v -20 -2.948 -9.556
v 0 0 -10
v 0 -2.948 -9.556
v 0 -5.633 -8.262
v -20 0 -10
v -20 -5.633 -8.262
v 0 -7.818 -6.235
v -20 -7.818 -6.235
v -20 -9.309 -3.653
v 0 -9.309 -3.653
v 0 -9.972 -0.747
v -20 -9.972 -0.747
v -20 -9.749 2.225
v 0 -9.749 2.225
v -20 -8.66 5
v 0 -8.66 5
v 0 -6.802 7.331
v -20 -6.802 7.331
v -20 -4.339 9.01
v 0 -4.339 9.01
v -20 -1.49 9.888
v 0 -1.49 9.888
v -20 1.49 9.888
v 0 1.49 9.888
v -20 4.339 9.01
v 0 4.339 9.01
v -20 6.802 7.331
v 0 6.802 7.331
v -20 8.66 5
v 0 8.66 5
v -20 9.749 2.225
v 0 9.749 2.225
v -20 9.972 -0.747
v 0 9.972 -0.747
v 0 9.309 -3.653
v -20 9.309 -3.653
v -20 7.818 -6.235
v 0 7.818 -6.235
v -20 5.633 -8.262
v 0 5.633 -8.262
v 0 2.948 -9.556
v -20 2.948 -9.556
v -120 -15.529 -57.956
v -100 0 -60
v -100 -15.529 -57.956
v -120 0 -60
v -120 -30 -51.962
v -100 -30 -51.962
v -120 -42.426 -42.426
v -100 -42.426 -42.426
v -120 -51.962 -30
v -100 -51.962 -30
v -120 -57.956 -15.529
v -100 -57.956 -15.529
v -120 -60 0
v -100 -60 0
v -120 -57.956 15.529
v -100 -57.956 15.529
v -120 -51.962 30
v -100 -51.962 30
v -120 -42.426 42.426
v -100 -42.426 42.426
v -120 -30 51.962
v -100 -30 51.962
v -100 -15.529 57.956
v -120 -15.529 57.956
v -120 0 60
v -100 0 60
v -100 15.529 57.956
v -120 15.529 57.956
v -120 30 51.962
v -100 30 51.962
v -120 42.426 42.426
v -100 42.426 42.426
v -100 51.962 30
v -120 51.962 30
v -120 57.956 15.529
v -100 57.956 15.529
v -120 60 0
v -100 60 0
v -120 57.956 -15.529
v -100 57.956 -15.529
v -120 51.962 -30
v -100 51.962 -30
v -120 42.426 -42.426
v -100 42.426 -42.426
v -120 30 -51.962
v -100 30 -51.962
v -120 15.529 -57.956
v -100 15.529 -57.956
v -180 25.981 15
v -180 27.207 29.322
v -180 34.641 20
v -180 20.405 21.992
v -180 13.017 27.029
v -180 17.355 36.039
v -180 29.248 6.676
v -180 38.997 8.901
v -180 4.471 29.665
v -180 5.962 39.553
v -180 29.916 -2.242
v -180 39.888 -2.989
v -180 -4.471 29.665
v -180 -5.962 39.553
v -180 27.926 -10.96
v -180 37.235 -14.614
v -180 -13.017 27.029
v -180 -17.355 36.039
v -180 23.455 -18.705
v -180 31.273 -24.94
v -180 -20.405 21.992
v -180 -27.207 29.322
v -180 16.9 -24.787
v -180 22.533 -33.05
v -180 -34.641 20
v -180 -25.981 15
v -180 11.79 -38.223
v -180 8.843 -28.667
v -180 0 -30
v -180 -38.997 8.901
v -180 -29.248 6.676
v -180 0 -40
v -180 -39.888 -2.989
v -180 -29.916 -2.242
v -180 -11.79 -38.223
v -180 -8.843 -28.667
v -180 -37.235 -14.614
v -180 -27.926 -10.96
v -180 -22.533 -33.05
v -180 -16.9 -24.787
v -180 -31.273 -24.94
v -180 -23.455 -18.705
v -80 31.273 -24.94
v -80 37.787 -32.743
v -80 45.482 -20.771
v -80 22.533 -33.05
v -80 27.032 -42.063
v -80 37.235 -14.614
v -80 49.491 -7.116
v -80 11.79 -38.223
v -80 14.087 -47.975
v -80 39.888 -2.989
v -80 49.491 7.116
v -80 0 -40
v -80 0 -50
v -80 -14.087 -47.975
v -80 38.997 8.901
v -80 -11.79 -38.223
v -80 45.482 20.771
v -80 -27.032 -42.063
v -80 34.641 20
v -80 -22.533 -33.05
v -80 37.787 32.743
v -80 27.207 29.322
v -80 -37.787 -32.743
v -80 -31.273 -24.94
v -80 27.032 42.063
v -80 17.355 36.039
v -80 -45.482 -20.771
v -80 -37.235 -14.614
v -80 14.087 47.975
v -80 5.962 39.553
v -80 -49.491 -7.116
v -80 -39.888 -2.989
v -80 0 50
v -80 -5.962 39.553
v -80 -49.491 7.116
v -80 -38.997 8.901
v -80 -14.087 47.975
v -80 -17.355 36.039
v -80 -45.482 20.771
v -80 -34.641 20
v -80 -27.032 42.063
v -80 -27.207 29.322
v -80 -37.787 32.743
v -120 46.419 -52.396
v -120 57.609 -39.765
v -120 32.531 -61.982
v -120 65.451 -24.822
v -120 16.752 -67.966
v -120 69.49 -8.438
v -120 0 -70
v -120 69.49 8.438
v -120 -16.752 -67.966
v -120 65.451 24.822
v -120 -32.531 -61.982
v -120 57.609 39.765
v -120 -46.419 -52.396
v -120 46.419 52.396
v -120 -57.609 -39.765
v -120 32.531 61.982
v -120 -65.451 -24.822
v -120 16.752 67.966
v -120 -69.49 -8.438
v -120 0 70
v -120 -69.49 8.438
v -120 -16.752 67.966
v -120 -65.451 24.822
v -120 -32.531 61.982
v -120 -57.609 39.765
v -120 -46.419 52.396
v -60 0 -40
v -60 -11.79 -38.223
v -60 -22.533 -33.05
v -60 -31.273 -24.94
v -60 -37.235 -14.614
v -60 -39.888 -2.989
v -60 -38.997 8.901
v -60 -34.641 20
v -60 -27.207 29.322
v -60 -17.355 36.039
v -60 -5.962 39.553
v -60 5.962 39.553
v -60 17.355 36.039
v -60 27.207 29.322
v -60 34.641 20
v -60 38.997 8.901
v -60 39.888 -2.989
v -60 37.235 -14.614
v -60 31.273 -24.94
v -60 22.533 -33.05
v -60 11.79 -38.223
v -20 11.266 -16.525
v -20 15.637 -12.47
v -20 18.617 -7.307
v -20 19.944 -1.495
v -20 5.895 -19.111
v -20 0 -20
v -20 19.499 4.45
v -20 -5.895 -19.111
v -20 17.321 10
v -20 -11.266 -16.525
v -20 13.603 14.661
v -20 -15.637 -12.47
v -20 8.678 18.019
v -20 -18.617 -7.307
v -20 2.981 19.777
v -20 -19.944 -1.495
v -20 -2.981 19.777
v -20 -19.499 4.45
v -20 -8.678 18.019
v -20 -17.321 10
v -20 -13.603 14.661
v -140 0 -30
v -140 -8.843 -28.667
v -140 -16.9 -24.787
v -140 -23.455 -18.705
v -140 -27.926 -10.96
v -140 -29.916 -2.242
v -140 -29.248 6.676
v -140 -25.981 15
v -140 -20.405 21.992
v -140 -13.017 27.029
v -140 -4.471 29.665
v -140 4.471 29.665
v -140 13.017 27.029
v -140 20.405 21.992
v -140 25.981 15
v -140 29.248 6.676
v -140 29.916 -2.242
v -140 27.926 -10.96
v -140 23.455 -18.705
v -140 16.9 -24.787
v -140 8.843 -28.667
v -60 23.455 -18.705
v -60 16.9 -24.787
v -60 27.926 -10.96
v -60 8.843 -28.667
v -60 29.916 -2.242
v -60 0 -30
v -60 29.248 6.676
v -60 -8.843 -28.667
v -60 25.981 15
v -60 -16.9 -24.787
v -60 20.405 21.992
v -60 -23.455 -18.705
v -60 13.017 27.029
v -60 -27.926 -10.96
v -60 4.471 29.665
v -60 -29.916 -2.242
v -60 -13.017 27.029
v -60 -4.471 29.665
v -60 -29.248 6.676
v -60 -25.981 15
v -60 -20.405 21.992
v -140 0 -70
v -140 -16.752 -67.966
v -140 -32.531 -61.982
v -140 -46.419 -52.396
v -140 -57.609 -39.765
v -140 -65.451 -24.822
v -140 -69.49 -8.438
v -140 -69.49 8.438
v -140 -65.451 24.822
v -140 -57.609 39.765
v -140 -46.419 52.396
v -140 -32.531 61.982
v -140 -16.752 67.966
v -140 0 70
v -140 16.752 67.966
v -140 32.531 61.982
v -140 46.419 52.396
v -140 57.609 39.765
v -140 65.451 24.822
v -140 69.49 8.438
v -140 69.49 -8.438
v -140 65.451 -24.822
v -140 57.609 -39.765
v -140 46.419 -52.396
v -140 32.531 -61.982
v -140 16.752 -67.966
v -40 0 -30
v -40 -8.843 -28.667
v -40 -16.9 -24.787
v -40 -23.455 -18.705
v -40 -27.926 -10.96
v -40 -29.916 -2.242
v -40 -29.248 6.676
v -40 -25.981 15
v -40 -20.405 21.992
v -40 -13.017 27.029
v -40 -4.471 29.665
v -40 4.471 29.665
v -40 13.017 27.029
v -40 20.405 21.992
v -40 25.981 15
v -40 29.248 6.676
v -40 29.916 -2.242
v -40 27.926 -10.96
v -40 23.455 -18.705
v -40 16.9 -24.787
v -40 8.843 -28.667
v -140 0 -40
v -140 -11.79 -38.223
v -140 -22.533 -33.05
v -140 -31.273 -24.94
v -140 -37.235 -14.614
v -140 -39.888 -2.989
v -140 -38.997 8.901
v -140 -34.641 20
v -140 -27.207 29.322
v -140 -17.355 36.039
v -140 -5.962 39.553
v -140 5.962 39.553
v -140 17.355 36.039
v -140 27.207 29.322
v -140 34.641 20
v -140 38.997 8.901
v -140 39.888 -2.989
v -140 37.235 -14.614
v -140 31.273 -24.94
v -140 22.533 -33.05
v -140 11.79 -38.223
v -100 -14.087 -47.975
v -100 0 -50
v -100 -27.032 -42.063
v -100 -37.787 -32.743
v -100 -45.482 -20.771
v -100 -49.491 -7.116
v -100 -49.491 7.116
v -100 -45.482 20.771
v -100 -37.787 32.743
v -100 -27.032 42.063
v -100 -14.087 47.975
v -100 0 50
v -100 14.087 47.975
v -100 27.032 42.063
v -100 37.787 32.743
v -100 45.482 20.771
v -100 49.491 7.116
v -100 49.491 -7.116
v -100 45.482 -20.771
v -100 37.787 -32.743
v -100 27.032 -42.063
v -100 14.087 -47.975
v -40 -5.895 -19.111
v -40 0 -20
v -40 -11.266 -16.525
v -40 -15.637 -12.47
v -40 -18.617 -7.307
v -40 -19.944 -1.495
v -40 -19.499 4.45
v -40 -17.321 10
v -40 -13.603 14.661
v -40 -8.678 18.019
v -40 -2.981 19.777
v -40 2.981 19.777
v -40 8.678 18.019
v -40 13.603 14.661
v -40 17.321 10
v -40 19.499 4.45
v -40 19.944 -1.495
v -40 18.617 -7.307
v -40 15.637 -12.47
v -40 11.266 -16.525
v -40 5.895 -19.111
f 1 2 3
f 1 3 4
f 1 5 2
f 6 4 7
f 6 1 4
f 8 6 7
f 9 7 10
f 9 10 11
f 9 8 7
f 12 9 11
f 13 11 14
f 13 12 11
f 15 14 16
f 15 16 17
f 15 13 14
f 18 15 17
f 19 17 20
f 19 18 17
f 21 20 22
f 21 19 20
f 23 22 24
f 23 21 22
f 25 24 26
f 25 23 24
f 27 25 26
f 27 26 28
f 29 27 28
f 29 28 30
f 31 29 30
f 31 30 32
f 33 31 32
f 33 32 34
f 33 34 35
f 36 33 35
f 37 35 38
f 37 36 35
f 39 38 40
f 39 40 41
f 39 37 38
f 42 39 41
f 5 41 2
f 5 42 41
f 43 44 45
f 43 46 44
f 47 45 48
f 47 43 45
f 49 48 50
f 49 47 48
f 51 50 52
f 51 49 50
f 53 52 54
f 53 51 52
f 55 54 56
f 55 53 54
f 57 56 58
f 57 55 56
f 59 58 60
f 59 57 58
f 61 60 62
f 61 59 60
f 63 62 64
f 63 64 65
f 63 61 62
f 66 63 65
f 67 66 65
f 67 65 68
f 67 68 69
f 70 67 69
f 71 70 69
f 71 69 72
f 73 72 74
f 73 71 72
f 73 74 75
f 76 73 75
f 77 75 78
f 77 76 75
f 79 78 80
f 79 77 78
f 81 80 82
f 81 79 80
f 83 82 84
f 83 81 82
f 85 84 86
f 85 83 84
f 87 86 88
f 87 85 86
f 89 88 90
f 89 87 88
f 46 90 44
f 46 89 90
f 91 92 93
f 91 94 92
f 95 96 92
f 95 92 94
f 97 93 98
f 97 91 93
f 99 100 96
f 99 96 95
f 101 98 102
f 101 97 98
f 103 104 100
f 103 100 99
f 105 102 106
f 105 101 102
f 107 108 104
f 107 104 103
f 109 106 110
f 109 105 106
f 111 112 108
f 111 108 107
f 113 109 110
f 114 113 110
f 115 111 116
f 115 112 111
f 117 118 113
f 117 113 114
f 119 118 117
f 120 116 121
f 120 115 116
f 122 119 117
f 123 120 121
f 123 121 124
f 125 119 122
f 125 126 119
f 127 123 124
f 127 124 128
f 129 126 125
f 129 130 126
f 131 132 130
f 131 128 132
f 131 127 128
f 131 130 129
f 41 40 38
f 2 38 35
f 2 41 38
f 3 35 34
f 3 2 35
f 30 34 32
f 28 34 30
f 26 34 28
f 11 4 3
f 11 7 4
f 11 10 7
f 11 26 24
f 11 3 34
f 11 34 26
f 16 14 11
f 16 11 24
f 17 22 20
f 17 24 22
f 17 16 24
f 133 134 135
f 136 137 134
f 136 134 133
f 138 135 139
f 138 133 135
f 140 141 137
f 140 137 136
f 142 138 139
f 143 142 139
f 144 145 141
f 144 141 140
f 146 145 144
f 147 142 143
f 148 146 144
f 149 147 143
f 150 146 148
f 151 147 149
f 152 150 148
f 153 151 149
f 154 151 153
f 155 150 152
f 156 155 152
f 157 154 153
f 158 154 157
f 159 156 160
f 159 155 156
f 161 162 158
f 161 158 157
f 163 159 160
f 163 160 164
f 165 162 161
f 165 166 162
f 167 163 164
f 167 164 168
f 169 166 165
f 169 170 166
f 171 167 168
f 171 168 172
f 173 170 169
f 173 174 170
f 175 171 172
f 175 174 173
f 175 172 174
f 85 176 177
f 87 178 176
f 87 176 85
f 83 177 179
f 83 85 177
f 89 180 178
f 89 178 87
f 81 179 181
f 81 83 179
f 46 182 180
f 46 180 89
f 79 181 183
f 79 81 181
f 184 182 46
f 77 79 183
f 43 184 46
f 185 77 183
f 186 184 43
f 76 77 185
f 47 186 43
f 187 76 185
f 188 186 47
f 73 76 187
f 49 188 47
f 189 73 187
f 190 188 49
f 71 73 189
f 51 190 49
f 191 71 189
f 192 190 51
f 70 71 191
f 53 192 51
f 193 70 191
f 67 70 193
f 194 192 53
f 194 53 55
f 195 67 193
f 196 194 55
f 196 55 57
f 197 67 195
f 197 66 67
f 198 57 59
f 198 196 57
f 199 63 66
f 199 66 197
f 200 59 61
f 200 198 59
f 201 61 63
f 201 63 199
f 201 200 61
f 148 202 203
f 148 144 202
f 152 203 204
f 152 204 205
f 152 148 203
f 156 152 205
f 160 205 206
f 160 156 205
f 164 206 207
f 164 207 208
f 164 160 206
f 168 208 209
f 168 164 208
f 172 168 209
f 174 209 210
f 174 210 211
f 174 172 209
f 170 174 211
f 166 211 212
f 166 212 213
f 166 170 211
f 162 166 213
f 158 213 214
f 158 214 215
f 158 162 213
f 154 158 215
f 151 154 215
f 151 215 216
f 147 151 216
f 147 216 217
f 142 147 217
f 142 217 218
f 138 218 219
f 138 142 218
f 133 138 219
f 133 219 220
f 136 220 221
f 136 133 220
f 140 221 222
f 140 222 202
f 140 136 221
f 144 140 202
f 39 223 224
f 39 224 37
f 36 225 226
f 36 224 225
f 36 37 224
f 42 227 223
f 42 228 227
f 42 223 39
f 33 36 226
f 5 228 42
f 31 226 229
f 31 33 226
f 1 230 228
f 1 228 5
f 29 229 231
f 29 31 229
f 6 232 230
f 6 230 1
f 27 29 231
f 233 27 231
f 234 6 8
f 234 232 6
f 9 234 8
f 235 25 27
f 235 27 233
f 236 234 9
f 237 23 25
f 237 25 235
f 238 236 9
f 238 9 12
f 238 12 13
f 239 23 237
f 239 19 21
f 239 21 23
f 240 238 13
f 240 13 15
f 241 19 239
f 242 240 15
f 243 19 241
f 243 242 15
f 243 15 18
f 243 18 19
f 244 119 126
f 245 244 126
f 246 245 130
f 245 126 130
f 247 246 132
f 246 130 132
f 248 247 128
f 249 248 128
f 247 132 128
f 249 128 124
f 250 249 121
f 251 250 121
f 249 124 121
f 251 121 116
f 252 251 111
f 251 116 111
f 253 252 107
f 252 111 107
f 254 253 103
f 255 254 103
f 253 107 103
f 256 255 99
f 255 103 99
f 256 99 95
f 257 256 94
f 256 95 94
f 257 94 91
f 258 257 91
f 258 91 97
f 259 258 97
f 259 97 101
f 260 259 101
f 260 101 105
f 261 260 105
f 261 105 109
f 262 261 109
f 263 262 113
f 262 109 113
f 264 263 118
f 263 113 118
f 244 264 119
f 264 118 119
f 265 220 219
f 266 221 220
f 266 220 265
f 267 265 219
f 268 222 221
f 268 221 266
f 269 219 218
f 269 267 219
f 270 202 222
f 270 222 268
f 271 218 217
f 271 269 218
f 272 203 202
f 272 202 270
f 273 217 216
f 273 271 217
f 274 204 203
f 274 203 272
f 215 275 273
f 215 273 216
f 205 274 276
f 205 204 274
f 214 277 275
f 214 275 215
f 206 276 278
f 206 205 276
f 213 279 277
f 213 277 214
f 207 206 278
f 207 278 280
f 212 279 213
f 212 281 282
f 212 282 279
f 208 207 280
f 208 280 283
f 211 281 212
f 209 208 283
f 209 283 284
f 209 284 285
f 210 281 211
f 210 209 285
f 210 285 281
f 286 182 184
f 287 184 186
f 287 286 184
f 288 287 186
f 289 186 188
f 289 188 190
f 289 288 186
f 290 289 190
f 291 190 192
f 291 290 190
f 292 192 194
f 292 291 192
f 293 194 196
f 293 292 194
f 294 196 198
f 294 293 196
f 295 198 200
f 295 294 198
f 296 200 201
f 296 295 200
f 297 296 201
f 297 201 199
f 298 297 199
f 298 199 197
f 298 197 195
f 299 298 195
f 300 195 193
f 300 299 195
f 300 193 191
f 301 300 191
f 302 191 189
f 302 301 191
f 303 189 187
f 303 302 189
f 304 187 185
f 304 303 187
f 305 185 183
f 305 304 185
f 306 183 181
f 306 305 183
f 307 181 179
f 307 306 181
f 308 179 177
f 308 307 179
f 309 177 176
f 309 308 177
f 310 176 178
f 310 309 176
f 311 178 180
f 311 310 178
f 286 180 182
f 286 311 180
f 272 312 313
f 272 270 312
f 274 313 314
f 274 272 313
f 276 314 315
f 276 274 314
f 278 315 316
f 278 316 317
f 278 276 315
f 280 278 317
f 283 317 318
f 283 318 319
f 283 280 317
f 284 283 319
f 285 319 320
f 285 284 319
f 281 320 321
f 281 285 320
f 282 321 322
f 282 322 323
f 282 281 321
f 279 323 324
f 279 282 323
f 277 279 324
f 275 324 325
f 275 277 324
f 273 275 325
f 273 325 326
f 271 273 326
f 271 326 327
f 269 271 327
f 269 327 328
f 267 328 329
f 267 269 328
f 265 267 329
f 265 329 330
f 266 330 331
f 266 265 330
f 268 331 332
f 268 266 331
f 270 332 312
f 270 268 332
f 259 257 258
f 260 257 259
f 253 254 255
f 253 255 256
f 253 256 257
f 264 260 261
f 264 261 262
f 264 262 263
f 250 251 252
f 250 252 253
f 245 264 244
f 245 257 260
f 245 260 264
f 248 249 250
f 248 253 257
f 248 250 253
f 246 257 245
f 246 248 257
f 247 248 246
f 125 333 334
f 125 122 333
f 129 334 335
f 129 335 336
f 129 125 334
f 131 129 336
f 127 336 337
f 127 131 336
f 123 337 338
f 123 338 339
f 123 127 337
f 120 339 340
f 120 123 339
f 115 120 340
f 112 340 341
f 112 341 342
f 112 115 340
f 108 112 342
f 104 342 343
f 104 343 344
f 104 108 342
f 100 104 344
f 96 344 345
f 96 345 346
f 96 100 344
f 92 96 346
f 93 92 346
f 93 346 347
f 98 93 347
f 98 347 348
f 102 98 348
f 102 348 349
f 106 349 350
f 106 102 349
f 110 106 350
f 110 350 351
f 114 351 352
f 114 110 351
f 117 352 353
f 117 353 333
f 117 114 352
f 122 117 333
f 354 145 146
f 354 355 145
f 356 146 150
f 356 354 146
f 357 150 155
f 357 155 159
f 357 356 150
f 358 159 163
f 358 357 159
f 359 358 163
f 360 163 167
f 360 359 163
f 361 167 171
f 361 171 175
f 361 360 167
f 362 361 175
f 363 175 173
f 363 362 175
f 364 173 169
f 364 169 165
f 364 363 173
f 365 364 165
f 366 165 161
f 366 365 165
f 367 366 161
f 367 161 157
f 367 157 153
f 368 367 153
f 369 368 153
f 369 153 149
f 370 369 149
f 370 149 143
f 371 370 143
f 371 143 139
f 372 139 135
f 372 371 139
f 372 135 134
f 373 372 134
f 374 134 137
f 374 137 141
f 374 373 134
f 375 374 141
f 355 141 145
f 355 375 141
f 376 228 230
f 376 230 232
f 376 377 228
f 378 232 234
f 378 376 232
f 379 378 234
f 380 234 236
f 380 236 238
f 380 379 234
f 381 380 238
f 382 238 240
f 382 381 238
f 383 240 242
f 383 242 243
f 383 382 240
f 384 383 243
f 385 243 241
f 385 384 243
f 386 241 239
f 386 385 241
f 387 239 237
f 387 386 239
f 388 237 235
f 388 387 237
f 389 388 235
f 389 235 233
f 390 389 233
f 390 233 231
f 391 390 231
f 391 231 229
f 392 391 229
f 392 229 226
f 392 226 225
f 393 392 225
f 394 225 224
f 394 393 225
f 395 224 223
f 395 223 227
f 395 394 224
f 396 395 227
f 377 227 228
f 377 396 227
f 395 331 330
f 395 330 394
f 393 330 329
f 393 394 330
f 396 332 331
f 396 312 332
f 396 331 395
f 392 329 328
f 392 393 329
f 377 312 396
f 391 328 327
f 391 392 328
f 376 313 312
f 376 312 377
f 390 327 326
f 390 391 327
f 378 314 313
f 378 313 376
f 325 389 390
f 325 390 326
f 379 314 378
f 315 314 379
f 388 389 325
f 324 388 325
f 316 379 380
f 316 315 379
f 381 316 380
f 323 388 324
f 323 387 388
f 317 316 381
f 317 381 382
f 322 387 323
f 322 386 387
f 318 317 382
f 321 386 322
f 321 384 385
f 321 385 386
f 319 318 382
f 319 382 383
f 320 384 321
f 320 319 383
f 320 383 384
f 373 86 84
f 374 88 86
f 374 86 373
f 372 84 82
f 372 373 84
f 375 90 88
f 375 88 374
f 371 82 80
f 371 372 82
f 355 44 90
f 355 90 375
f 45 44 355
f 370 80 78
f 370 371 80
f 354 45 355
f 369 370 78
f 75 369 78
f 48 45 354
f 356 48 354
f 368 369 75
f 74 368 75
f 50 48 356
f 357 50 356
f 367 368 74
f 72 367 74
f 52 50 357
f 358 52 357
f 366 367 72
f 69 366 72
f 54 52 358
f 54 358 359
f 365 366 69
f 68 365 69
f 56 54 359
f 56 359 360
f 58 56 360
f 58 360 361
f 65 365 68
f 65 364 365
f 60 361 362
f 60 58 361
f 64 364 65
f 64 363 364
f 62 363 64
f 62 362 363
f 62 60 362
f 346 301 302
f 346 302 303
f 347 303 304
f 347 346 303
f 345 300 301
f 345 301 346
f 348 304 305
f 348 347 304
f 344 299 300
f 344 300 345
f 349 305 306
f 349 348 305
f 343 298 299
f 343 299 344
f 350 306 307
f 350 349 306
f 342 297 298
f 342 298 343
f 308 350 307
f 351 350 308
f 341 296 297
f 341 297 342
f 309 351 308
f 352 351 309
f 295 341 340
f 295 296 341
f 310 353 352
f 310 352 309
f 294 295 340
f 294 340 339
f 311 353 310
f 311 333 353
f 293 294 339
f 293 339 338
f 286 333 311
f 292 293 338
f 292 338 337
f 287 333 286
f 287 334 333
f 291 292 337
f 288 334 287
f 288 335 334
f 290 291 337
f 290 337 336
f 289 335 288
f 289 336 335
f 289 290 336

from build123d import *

# Parameters (mm, degrees)
SKETCH2_R          = 30
CUT_EXTRUDE1_DEPTH = 40


with BuildPart() as part:
    # Sketch1 → Revolve1 (revolve)
    with BuildSketch(Plane.XY, mode=Mode.PRIVATE) as revolve1_sk:
        Polygon((0, 0), (0, 10), (-20, 10), (-20, 20), (-40, 20), (-40, 30), (-60, 30), (-60, 40), (-80, 40), (-80, 50), (-100, 50), (-100, 60), (-120, 60), (-120, 70), (-140, 70), (-140, 40), (-180, 40), (-180, 0), align=None)
    revolve(revolve1_sk.sketch.rotate(Axis((0, 0, 0), (-1, 0, 0)), 90), axis=Axis((0, 0, 0), (-1, 0, 0)))  # turned: the seam where the file's is

    # Sketch2 → Cut-Extrude1 (cut)
    with BuildSketch(Plane.ZY.offset(180)):
        with Locations(Location((0, 0, 0), (0, 0, 180))):  # turned: the seam where the file's is
            Circle(SKETCH2_R)
    extrude(amount=-CUT_EXTRUDE1_DEPTH, mode=Mode.SUBTRACT)


solid = part.part
